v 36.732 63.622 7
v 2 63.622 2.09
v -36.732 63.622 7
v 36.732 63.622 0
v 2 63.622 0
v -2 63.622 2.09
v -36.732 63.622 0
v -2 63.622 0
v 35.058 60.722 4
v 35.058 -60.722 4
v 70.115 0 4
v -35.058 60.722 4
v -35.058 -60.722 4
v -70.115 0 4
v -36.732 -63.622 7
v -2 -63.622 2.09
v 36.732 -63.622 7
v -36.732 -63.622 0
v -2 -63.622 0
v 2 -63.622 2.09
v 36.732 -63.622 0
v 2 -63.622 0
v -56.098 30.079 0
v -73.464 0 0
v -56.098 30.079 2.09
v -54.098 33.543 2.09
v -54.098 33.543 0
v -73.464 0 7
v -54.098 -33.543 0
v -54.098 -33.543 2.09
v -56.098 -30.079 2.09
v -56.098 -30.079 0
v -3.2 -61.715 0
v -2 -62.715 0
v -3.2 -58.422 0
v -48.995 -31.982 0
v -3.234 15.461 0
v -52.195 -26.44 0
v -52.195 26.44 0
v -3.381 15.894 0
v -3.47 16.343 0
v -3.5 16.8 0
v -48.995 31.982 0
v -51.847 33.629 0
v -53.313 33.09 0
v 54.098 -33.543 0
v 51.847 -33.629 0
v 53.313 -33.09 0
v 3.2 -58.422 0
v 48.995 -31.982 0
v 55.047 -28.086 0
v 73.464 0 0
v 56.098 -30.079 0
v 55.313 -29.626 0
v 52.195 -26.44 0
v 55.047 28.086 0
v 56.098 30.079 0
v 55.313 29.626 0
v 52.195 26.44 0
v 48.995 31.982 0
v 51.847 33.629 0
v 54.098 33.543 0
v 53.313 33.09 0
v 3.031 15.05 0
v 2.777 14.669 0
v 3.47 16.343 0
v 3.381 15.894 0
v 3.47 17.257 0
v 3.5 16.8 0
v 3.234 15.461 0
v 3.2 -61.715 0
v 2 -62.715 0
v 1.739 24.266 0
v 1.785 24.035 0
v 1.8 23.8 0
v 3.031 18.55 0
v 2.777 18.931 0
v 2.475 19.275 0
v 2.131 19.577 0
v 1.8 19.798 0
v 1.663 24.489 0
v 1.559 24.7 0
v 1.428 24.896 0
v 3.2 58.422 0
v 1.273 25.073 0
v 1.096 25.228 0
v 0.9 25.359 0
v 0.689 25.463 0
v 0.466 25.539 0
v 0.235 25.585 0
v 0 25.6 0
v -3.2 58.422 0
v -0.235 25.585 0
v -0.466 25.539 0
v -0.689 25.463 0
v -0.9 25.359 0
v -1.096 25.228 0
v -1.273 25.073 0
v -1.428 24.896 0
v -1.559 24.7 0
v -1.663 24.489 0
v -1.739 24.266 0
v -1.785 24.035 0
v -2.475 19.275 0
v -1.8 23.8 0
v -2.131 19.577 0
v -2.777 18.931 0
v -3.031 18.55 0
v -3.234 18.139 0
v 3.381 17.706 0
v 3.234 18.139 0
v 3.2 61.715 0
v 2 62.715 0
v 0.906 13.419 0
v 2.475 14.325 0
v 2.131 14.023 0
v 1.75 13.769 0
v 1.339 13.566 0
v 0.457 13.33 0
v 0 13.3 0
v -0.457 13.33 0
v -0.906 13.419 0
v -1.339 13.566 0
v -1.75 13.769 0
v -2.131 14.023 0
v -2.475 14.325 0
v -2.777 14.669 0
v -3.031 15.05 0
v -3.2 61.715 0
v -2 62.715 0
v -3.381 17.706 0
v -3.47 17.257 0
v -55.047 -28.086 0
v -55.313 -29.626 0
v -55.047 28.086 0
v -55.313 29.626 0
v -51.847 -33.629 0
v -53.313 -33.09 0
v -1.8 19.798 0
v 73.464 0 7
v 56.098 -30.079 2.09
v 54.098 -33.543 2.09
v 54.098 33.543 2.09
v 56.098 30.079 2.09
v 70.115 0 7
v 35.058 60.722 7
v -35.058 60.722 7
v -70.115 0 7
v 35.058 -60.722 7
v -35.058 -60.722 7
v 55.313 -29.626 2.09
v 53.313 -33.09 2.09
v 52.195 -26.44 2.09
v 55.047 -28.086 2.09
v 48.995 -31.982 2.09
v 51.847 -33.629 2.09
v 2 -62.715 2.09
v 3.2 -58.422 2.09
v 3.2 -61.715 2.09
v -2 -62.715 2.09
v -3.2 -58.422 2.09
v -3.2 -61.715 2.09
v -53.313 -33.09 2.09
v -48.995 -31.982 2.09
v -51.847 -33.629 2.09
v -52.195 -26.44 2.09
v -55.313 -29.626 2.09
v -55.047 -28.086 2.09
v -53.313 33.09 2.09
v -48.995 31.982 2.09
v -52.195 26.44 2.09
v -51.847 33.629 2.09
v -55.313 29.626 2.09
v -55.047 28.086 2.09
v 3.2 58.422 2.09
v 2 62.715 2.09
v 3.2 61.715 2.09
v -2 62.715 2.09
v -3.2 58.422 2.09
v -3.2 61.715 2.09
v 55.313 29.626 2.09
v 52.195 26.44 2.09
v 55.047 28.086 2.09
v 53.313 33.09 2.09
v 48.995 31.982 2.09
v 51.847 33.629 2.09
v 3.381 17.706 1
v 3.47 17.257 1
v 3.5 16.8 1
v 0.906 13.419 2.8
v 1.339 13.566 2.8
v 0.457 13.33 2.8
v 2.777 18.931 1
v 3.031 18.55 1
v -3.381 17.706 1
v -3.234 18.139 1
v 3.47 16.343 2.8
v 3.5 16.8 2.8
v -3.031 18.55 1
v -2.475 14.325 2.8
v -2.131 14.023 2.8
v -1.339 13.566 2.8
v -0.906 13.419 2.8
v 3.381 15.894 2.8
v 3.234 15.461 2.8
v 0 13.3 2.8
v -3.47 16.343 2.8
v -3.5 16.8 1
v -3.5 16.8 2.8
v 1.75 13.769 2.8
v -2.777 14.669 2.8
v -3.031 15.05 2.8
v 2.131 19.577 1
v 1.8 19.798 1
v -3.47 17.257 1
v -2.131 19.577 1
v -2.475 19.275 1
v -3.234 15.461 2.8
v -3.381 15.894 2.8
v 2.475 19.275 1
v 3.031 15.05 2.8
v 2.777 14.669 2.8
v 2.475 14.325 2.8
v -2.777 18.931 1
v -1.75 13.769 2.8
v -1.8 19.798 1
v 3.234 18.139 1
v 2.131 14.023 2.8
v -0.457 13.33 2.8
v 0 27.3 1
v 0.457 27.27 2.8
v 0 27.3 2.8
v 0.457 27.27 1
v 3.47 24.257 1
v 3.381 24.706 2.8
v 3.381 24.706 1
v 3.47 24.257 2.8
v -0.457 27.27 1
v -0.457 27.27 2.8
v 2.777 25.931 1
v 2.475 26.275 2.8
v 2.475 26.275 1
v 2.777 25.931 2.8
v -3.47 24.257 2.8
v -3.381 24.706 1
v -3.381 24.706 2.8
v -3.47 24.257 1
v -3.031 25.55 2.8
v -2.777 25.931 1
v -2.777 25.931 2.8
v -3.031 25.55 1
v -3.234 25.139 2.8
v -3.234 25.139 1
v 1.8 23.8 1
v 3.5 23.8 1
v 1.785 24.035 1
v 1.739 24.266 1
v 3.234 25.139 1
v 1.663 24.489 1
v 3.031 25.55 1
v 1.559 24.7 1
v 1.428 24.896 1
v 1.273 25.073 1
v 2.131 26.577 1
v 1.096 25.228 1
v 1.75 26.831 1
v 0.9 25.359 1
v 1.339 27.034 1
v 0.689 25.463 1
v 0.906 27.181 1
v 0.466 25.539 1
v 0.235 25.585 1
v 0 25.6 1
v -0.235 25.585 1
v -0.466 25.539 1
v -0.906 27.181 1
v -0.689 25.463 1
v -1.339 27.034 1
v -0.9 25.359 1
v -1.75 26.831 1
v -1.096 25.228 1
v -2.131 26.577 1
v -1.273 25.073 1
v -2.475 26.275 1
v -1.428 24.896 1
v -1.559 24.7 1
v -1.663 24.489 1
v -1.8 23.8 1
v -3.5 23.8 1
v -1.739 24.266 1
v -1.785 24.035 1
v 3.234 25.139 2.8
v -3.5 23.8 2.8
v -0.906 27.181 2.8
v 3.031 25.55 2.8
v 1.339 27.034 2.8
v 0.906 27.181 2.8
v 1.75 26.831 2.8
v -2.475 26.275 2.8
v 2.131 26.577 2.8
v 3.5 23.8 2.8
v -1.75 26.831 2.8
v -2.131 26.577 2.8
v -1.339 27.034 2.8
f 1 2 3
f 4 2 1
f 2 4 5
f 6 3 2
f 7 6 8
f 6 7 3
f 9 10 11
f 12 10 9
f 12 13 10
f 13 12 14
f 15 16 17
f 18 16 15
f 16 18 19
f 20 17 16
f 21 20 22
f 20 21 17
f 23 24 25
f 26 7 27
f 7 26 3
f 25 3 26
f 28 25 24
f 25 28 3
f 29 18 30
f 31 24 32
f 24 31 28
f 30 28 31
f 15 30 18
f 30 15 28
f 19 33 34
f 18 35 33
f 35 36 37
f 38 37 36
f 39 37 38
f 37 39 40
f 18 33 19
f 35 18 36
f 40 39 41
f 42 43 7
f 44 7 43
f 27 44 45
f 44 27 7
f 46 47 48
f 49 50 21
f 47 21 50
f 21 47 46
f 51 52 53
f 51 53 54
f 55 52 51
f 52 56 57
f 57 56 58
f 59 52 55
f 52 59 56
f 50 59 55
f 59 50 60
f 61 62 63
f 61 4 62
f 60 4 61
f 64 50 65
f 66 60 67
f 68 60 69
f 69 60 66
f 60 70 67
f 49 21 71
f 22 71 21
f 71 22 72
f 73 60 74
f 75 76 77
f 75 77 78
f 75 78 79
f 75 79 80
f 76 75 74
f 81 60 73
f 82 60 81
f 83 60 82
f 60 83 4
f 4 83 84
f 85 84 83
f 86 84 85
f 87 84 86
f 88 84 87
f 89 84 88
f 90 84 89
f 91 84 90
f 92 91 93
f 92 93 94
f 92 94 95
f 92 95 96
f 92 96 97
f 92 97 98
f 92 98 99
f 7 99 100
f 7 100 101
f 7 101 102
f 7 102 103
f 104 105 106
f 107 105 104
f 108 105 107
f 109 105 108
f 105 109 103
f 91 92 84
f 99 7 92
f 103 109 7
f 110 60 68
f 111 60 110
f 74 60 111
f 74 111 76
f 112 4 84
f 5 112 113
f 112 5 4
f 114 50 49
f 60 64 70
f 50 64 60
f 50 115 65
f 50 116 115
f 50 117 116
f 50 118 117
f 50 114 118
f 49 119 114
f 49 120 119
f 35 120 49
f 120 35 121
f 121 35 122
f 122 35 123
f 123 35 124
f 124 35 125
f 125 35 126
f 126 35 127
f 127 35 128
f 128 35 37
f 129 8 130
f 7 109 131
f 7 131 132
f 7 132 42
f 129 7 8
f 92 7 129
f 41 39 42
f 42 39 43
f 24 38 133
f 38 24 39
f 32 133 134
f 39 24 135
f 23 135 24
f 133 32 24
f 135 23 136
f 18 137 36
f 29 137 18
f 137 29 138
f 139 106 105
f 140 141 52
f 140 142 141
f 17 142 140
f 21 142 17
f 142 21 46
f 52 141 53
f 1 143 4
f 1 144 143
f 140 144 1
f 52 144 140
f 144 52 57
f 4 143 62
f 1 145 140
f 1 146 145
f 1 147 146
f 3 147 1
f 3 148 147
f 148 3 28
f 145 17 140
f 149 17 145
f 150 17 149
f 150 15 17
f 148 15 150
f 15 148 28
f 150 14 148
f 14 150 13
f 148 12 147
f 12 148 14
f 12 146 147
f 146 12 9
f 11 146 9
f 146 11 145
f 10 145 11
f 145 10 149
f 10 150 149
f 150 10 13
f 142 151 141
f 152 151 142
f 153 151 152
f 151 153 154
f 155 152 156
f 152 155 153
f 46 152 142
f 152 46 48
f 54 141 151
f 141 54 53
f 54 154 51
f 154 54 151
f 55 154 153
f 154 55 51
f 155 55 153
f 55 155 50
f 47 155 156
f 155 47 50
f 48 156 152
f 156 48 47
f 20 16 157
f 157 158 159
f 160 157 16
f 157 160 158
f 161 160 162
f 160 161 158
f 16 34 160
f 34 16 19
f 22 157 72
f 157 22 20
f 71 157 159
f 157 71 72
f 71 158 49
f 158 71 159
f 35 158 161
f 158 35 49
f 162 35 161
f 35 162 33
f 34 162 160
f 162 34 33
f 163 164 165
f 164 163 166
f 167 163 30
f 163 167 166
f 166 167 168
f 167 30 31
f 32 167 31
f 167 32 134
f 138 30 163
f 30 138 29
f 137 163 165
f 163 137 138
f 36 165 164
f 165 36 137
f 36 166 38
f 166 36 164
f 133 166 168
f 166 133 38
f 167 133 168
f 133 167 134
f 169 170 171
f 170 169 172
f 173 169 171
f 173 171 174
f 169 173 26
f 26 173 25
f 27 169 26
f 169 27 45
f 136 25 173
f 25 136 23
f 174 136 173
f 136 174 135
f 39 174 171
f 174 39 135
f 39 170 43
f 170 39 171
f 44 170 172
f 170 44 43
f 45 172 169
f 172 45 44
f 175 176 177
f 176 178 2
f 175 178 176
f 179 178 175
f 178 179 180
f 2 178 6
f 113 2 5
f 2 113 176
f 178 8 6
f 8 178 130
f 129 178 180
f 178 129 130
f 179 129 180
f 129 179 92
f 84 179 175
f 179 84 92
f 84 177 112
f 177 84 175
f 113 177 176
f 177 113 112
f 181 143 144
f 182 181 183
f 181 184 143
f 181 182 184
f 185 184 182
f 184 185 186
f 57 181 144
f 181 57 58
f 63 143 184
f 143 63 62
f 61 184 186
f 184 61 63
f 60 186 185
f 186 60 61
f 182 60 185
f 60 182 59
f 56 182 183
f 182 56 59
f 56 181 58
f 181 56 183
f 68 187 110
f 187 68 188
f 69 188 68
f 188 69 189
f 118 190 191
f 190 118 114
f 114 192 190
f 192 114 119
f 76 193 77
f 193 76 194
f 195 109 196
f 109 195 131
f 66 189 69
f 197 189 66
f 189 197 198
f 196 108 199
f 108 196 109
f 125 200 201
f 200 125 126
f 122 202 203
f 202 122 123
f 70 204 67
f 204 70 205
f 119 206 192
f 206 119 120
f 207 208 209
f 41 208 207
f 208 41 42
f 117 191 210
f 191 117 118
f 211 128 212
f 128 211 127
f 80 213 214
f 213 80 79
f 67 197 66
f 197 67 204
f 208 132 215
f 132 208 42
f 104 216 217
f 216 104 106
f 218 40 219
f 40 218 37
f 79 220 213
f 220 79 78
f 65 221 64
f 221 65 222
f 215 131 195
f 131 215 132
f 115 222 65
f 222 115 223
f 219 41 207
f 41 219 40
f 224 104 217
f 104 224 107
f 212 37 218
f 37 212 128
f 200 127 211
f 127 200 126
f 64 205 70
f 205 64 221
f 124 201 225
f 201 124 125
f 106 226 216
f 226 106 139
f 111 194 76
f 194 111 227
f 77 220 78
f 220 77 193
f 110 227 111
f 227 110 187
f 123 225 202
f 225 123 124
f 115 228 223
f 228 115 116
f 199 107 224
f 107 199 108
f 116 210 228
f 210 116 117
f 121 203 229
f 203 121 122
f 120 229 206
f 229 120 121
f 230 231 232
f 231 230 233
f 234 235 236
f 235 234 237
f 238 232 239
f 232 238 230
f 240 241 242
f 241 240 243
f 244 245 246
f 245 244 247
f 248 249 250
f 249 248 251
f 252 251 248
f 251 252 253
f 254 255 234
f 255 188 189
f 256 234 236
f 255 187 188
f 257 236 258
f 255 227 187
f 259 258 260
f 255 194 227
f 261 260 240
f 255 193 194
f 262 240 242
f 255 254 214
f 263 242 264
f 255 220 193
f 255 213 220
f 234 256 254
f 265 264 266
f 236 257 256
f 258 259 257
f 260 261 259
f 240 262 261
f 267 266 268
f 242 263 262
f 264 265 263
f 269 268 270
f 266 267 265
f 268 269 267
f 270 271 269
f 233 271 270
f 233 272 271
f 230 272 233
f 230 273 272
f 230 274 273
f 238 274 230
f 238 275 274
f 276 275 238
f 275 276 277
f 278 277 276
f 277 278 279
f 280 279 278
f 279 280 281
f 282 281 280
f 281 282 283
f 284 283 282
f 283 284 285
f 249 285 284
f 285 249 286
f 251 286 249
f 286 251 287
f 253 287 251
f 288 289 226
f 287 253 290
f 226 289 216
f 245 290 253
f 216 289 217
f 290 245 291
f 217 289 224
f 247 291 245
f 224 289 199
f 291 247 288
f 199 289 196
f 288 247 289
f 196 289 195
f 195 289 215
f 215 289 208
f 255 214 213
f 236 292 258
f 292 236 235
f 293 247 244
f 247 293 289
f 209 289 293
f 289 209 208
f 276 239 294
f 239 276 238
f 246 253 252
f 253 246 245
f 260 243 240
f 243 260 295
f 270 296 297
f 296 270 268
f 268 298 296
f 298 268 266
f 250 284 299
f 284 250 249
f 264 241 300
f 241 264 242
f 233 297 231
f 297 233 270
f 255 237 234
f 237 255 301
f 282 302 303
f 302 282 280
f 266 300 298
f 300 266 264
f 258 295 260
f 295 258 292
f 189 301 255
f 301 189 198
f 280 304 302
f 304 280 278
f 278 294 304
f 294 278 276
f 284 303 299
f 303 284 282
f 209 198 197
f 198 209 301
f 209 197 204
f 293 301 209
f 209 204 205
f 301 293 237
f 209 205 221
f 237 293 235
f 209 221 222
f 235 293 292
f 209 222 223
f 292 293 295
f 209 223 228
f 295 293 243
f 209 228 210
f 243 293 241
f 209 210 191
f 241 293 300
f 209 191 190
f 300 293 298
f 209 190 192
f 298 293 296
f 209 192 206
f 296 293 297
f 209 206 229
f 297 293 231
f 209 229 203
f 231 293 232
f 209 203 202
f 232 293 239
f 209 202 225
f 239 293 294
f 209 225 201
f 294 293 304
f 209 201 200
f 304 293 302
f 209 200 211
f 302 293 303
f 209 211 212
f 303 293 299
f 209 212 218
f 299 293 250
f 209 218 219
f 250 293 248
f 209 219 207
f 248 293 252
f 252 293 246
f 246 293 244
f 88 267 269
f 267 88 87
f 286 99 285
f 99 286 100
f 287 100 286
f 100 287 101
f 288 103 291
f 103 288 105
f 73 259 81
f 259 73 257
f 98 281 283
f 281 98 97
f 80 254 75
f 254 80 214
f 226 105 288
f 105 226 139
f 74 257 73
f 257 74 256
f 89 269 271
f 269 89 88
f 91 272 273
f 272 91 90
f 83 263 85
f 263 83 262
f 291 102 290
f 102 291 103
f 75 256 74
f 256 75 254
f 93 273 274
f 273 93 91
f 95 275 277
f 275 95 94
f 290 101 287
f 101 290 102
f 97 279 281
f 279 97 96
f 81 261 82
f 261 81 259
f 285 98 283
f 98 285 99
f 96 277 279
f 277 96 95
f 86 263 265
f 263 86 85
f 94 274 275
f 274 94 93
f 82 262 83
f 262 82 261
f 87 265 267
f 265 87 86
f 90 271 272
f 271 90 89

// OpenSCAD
// Contour Studio hex holder. mm. Same sockets and keyhole as modular map holders.
$fn=48; tile=140; gap=6; tolerance=.2; seat=4; rim=3;
module tile_shape(){polygon([[70.00000000000001, -1.4210854715202004e-14], [35.000000000000014, 60.62177826491069], [-34.99999999999997, 60.62177826491069], [-69.99999999999999, 0.0], [-35.000000000000014, -60.6217782649107], [35.000000000000014, -60.621778264910716]]);}
module key_shape(){polygon([[-5,-3],[-2,-3],[-1,-1.8],[1,-1.8],[2,-3],[5,-3],[5,3],[2,3],[1,1.8],[-1,1.8],[-2,3],[-5,3]]);}
difference(){
 union(){linear_extrude(seat) offset(delta=gap/2) tile_shape();translate([0,0,seat]) linear_extrude(rim) difference(){offset(delta=gap/2) tile_shape();offset(delta=tolerance/2) tile_shape();}}
translate([55.09807621135334,-31.810889132455365,-.01]) rotate([0,0,-30.000000000000004]) linear_extrude(2.1) offset(delta=tolerance) key_shape();
translate([3.552713678800501e-15,-63.62177826491071,-.01]) rotate([0,0,-90.0]) linear_extrude(2.1) offset(delta=tolerance) key_shape();
translate([-55.098076211353316,-31.81088913245535,-.01]) rotate([0,0,-150.0]) linear_extrude(2.1) offset(delta=tolerance) key_shape();
translate([-55.09807621135329,31.810889132455344,-.01]) rotate([0,0,150.0]) linear_extrude(2.1) offset(delta=tolerance) key_shape();
translate([2.4868995751603507e-14,63.62177826491069,-.01]) rotate([0,0,89.99999999999999]) linear_extrude(2.1) offset(delta=tolerance) key_shape();
translate([55.09807621135334,31.810889132455337,-.01]) rotate([0,0,29.99999999999998]) linear_extrude(2.1) offset(delta=tolerance) key_shape();
translate([0,16.8,-.01]) cylinder(h=2.8,r=3.5);
translate([0,16.8,1]) linear_extrude(1.8) hull(){circle(r=3.5);translate([0,7]) circle(r=3.5);}
translate([0,16.8,-.01]) linear_extrude(1.1) hull(){circle(r=1.8);translate([0,7]) circle(r=1.8);}
}
